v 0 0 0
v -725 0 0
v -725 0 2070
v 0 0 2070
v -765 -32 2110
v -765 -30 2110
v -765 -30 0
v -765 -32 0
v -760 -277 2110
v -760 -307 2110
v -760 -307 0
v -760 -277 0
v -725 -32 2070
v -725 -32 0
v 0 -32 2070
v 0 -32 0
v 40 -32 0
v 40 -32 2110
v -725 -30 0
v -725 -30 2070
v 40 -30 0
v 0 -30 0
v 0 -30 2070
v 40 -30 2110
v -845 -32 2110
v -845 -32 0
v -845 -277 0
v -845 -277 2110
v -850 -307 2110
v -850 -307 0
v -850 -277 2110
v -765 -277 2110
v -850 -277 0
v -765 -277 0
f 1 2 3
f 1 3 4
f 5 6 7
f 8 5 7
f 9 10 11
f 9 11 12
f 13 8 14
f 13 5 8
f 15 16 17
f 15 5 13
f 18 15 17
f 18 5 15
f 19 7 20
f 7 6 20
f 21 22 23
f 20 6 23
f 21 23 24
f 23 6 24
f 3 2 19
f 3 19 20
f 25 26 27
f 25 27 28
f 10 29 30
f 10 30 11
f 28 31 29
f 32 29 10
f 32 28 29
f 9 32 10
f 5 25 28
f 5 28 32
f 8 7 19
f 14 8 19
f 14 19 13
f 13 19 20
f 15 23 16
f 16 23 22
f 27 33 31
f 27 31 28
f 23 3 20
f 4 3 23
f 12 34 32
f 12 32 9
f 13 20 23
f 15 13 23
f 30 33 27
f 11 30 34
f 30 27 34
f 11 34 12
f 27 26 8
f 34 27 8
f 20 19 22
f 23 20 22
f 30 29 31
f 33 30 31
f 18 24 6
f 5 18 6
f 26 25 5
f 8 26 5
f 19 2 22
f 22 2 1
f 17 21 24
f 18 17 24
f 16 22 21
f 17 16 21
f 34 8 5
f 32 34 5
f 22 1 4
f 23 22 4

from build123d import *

# Parameters (mm, degrees)
F0_W     = 725
F0_H     = 2070
F1_DEPTH = 30
F3_DEPTH = 2
F4_W     = 80
F4_H     = 2110
F5_DEPTH = 245
F6_W     = 90
F6_H     = 30
F7_DEPTH = 2110


with BuildPart() as f1:
    # F0 (on Front) → F1 (new body)
    with BuildSketch(Plane.XZ):
        with Locations((-362.5, 1035)):
            Rectangle(F0_W, F0_H)
    extrude(amount=F1_DEPTH)


with BuildPart() as f3:
    # F2 (on face) → F3 (new body)
    with BuildSketch(Plane.XZ.offset(30)):
        Polygon((-765, 0), (-725, 0), (-725, 2070), (0, 2070), (0, 0), (40, 0), (40, 2110), (0, 2110), (-725, 2110), (-765, 2110), align=None)
    extrude(amount=F3_DEPTH)


with BuildPart() as f5:
    # F4 (on face) → F5 (new body)
    with BuildSketch(Plane.XZ.offset(32)):
        with Locations((-805, 1055)):
            Rectangle(F4_W, F4_H)
    extrude(amount=F5_DEPTH)

    # F6 (on face) → F7 (join)
    with BuildSketch(Plane.XY.offset(2110)):
        with Locations((-805, -292)):
            Rectangle(F6_W, F6_H)
    extrude(amount=-F7_DEPTH)


solid = Compound([f1.part, f3.part, f5.part])
